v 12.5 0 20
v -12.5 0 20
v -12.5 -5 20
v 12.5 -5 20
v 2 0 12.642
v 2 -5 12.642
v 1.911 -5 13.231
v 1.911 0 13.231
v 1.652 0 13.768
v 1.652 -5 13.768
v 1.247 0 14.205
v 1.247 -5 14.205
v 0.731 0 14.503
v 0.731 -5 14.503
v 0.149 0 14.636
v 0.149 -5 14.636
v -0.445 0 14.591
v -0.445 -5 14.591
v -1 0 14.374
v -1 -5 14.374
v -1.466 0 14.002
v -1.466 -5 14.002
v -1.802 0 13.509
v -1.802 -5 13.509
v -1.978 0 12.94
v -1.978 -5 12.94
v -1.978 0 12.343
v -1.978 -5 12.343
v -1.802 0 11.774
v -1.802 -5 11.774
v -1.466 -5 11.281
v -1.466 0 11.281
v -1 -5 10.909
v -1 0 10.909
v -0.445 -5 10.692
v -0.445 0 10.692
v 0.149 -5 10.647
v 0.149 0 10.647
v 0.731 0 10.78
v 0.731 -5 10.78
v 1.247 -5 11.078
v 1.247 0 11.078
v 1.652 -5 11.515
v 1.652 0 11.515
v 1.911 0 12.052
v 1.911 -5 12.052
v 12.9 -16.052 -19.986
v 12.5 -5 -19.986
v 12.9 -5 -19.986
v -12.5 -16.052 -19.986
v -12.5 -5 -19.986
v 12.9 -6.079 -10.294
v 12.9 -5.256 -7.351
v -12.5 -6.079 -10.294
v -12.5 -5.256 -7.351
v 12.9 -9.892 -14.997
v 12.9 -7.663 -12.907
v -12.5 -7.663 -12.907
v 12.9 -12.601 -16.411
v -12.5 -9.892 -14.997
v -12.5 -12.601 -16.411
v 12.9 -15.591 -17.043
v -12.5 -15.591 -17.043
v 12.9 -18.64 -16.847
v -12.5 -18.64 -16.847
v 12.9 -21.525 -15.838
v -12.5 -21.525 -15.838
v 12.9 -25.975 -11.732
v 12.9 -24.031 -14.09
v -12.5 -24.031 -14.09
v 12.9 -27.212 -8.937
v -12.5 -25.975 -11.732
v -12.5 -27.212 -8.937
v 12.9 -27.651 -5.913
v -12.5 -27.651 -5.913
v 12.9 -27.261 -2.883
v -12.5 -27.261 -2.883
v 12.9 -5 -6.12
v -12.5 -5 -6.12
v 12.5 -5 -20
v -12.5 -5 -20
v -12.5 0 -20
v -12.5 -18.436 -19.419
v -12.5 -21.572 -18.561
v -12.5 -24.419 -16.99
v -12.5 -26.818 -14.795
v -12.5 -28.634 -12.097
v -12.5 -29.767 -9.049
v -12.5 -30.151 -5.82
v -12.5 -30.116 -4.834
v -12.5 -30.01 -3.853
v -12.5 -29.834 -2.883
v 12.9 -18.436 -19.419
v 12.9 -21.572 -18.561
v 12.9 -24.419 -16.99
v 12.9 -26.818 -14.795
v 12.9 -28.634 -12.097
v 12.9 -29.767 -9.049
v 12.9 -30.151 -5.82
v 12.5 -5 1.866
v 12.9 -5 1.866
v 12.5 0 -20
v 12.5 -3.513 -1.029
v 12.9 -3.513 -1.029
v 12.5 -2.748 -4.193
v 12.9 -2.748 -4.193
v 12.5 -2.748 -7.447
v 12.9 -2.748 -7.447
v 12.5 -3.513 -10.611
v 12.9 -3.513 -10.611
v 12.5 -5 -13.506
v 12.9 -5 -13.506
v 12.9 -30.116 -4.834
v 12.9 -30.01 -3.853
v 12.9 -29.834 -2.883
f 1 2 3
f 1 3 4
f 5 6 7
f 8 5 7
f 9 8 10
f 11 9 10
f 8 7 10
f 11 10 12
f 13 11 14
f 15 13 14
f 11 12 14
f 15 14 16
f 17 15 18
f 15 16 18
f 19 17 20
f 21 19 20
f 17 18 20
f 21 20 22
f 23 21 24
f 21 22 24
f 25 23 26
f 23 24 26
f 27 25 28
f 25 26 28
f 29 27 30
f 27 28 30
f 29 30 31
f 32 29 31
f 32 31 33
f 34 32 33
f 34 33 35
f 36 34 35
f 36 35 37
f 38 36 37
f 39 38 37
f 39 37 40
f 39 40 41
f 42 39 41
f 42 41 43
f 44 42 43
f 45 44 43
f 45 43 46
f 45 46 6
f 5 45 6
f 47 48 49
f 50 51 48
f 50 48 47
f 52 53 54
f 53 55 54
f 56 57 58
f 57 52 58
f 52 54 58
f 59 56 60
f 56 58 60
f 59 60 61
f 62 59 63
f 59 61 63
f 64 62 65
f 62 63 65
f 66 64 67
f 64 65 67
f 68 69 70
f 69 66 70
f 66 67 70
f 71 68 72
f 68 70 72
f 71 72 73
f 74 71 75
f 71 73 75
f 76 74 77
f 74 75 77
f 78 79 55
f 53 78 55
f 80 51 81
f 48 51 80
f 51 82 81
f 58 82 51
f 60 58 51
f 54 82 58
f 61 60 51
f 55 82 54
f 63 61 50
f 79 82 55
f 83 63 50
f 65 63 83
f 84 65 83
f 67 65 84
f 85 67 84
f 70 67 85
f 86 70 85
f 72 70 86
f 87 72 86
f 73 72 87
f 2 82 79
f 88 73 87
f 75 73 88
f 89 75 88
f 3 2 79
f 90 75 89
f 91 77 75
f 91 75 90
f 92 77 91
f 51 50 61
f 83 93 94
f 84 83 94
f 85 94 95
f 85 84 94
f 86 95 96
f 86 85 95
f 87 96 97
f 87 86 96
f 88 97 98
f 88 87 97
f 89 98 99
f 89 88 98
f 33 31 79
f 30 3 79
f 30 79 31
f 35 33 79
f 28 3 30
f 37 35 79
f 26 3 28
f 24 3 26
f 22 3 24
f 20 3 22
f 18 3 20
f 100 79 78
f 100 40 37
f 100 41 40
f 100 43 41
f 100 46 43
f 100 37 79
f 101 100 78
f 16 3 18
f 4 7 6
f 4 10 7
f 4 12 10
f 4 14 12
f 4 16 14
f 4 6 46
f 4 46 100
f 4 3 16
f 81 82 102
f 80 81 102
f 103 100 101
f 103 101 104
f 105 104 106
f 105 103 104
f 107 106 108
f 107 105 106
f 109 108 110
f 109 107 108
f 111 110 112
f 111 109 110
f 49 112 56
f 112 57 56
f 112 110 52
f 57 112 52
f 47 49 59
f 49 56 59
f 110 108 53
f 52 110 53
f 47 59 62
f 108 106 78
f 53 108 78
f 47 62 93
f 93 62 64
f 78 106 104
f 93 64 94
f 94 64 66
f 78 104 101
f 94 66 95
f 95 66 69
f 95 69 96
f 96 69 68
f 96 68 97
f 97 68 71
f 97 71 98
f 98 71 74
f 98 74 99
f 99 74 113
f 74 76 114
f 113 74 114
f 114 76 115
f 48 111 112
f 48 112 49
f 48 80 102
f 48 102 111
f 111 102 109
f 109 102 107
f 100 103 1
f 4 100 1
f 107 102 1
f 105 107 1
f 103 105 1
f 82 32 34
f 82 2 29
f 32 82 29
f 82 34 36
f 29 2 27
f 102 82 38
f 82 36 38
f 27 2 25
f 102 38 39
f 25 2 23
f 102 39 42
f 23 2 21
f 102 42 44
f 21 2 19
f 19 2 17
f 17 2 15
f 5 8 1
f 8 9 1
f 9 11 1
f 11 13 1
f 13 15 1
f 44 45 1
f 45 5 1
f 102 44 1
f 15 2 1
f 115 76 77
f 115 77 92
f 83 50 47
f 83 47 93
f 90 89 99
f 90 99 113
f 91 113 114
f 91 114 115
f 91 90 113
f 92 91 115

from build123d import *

# Parameters (mm, degrees)
F0_W      = 25
F0_H      = 40
F1_DEPTH  = 5
F6_DEPTH  = 25.4
F3_R      = 13.75
F7_DEPTH  = 25.4
F9_DEPTH  = 25.4
F2_R      = 11.25
F10_DEPTH = 25.4
F12_DEPTH = 25.4
F13_R     = 2
F14_DEPTH = 25.4


# Not quite as in the source:
# - a feature names something its author has since deleted; it is built from what else it names


with BuildPart() as f1:
    # F0 (on Front) → F1 (new body)
    with BuildSketch(Plane.XZ):
        Rectangle(F0_W, F0_H)
    extrude(amount=F1_DEPTH)

    # F3 (on face) → F6 (join)
    with BuildSketch(Plane(origin=(-12.5, 0, 0), x_dir=(0, -1, 0), z_dir=(-1, 0, 0))):
        with BuildLine():
            ThreePointArc((5, -13.5062897776), (20.4196296212, -18.9696149078), (30.1510077715, -5.8199693449))
            ThreePointArc((30.1510077715, -5.8199693449), (20.4196296212, 7.329676218), (5, 1.8663510878))
            Line((5, 1.8663510878), (5, -13.5062897776))
        make_face()
    extrude(amount=-F6_DEPTH)

    # F3 (on face) → F7 (join)
    with BuildSketch(Plane(origin=(-12.5, 0, 0), x_dir=(0, -1, 0), z_dir=(-1, 0, 0))):
        with Locations((16.4010077715, -5.8199693449)):
            Circle(F3_R)
    extrude(amount=-F7_DEPTH)

    # F8 (on face) → F9 (join)
    with BuildSketch(Plane(origin=(-12.5, 0, 0), x_dir=(0, -1, 0), z_dir=(-1, 0, 0))):
        Polygon((5, -12.7877519428), (5, -19.9861098081), (16.0521287471, -19.9861098081), (19.5415690541, -19.1552899778), (7.0377378725, -15.2296693996), align=None)
    extrude(amount=-F9_DEPTH)

    # F2 (on face) → F10 (cut)
    with BuildSketch(Plane(origin=(-12.5, 0, 0), x_dir=(0, -1, 0), z_dir=(-1, 0, 0))):
        with Locations((16.4017565548, -5.8220350184)):
            Circle(F2_R)
    extrude(amount=-F10_DEPTH, mode=Mode.SUBTRACT)

    # F11 (on face) → F12 (cut)
    with BuildSketch(Plane(origin=(-12.5, 0, 0), x_dir=(0, -1, 0), z_dir=(-1, 0, 0))):
        Polygon((12.1690463275, 13.4603166953), (5, 3.5622220363), (5, -6.1200439696), (5.3498325869, -7.8012463637), (19.8114402592, -7.8012463637), (20.6344667822, -2.8826519847), (33.6853265762, -2.8826519847), (32.509572804, 10.7560846955), align=None)
    extrude(amount=-F12_DEPTH, mode=Mode.SUBTRACT)

    # F13 (on face) → F14 (cut)
    with BuildSketch(Plane.XZ.offset(5)):
        with Locations((0, 12.6415221021)):
            Circle(F13_R)
    extrude(amount=-F14_DEPTH, mode=Mode.SUBTRACT)


solid = f1.part
